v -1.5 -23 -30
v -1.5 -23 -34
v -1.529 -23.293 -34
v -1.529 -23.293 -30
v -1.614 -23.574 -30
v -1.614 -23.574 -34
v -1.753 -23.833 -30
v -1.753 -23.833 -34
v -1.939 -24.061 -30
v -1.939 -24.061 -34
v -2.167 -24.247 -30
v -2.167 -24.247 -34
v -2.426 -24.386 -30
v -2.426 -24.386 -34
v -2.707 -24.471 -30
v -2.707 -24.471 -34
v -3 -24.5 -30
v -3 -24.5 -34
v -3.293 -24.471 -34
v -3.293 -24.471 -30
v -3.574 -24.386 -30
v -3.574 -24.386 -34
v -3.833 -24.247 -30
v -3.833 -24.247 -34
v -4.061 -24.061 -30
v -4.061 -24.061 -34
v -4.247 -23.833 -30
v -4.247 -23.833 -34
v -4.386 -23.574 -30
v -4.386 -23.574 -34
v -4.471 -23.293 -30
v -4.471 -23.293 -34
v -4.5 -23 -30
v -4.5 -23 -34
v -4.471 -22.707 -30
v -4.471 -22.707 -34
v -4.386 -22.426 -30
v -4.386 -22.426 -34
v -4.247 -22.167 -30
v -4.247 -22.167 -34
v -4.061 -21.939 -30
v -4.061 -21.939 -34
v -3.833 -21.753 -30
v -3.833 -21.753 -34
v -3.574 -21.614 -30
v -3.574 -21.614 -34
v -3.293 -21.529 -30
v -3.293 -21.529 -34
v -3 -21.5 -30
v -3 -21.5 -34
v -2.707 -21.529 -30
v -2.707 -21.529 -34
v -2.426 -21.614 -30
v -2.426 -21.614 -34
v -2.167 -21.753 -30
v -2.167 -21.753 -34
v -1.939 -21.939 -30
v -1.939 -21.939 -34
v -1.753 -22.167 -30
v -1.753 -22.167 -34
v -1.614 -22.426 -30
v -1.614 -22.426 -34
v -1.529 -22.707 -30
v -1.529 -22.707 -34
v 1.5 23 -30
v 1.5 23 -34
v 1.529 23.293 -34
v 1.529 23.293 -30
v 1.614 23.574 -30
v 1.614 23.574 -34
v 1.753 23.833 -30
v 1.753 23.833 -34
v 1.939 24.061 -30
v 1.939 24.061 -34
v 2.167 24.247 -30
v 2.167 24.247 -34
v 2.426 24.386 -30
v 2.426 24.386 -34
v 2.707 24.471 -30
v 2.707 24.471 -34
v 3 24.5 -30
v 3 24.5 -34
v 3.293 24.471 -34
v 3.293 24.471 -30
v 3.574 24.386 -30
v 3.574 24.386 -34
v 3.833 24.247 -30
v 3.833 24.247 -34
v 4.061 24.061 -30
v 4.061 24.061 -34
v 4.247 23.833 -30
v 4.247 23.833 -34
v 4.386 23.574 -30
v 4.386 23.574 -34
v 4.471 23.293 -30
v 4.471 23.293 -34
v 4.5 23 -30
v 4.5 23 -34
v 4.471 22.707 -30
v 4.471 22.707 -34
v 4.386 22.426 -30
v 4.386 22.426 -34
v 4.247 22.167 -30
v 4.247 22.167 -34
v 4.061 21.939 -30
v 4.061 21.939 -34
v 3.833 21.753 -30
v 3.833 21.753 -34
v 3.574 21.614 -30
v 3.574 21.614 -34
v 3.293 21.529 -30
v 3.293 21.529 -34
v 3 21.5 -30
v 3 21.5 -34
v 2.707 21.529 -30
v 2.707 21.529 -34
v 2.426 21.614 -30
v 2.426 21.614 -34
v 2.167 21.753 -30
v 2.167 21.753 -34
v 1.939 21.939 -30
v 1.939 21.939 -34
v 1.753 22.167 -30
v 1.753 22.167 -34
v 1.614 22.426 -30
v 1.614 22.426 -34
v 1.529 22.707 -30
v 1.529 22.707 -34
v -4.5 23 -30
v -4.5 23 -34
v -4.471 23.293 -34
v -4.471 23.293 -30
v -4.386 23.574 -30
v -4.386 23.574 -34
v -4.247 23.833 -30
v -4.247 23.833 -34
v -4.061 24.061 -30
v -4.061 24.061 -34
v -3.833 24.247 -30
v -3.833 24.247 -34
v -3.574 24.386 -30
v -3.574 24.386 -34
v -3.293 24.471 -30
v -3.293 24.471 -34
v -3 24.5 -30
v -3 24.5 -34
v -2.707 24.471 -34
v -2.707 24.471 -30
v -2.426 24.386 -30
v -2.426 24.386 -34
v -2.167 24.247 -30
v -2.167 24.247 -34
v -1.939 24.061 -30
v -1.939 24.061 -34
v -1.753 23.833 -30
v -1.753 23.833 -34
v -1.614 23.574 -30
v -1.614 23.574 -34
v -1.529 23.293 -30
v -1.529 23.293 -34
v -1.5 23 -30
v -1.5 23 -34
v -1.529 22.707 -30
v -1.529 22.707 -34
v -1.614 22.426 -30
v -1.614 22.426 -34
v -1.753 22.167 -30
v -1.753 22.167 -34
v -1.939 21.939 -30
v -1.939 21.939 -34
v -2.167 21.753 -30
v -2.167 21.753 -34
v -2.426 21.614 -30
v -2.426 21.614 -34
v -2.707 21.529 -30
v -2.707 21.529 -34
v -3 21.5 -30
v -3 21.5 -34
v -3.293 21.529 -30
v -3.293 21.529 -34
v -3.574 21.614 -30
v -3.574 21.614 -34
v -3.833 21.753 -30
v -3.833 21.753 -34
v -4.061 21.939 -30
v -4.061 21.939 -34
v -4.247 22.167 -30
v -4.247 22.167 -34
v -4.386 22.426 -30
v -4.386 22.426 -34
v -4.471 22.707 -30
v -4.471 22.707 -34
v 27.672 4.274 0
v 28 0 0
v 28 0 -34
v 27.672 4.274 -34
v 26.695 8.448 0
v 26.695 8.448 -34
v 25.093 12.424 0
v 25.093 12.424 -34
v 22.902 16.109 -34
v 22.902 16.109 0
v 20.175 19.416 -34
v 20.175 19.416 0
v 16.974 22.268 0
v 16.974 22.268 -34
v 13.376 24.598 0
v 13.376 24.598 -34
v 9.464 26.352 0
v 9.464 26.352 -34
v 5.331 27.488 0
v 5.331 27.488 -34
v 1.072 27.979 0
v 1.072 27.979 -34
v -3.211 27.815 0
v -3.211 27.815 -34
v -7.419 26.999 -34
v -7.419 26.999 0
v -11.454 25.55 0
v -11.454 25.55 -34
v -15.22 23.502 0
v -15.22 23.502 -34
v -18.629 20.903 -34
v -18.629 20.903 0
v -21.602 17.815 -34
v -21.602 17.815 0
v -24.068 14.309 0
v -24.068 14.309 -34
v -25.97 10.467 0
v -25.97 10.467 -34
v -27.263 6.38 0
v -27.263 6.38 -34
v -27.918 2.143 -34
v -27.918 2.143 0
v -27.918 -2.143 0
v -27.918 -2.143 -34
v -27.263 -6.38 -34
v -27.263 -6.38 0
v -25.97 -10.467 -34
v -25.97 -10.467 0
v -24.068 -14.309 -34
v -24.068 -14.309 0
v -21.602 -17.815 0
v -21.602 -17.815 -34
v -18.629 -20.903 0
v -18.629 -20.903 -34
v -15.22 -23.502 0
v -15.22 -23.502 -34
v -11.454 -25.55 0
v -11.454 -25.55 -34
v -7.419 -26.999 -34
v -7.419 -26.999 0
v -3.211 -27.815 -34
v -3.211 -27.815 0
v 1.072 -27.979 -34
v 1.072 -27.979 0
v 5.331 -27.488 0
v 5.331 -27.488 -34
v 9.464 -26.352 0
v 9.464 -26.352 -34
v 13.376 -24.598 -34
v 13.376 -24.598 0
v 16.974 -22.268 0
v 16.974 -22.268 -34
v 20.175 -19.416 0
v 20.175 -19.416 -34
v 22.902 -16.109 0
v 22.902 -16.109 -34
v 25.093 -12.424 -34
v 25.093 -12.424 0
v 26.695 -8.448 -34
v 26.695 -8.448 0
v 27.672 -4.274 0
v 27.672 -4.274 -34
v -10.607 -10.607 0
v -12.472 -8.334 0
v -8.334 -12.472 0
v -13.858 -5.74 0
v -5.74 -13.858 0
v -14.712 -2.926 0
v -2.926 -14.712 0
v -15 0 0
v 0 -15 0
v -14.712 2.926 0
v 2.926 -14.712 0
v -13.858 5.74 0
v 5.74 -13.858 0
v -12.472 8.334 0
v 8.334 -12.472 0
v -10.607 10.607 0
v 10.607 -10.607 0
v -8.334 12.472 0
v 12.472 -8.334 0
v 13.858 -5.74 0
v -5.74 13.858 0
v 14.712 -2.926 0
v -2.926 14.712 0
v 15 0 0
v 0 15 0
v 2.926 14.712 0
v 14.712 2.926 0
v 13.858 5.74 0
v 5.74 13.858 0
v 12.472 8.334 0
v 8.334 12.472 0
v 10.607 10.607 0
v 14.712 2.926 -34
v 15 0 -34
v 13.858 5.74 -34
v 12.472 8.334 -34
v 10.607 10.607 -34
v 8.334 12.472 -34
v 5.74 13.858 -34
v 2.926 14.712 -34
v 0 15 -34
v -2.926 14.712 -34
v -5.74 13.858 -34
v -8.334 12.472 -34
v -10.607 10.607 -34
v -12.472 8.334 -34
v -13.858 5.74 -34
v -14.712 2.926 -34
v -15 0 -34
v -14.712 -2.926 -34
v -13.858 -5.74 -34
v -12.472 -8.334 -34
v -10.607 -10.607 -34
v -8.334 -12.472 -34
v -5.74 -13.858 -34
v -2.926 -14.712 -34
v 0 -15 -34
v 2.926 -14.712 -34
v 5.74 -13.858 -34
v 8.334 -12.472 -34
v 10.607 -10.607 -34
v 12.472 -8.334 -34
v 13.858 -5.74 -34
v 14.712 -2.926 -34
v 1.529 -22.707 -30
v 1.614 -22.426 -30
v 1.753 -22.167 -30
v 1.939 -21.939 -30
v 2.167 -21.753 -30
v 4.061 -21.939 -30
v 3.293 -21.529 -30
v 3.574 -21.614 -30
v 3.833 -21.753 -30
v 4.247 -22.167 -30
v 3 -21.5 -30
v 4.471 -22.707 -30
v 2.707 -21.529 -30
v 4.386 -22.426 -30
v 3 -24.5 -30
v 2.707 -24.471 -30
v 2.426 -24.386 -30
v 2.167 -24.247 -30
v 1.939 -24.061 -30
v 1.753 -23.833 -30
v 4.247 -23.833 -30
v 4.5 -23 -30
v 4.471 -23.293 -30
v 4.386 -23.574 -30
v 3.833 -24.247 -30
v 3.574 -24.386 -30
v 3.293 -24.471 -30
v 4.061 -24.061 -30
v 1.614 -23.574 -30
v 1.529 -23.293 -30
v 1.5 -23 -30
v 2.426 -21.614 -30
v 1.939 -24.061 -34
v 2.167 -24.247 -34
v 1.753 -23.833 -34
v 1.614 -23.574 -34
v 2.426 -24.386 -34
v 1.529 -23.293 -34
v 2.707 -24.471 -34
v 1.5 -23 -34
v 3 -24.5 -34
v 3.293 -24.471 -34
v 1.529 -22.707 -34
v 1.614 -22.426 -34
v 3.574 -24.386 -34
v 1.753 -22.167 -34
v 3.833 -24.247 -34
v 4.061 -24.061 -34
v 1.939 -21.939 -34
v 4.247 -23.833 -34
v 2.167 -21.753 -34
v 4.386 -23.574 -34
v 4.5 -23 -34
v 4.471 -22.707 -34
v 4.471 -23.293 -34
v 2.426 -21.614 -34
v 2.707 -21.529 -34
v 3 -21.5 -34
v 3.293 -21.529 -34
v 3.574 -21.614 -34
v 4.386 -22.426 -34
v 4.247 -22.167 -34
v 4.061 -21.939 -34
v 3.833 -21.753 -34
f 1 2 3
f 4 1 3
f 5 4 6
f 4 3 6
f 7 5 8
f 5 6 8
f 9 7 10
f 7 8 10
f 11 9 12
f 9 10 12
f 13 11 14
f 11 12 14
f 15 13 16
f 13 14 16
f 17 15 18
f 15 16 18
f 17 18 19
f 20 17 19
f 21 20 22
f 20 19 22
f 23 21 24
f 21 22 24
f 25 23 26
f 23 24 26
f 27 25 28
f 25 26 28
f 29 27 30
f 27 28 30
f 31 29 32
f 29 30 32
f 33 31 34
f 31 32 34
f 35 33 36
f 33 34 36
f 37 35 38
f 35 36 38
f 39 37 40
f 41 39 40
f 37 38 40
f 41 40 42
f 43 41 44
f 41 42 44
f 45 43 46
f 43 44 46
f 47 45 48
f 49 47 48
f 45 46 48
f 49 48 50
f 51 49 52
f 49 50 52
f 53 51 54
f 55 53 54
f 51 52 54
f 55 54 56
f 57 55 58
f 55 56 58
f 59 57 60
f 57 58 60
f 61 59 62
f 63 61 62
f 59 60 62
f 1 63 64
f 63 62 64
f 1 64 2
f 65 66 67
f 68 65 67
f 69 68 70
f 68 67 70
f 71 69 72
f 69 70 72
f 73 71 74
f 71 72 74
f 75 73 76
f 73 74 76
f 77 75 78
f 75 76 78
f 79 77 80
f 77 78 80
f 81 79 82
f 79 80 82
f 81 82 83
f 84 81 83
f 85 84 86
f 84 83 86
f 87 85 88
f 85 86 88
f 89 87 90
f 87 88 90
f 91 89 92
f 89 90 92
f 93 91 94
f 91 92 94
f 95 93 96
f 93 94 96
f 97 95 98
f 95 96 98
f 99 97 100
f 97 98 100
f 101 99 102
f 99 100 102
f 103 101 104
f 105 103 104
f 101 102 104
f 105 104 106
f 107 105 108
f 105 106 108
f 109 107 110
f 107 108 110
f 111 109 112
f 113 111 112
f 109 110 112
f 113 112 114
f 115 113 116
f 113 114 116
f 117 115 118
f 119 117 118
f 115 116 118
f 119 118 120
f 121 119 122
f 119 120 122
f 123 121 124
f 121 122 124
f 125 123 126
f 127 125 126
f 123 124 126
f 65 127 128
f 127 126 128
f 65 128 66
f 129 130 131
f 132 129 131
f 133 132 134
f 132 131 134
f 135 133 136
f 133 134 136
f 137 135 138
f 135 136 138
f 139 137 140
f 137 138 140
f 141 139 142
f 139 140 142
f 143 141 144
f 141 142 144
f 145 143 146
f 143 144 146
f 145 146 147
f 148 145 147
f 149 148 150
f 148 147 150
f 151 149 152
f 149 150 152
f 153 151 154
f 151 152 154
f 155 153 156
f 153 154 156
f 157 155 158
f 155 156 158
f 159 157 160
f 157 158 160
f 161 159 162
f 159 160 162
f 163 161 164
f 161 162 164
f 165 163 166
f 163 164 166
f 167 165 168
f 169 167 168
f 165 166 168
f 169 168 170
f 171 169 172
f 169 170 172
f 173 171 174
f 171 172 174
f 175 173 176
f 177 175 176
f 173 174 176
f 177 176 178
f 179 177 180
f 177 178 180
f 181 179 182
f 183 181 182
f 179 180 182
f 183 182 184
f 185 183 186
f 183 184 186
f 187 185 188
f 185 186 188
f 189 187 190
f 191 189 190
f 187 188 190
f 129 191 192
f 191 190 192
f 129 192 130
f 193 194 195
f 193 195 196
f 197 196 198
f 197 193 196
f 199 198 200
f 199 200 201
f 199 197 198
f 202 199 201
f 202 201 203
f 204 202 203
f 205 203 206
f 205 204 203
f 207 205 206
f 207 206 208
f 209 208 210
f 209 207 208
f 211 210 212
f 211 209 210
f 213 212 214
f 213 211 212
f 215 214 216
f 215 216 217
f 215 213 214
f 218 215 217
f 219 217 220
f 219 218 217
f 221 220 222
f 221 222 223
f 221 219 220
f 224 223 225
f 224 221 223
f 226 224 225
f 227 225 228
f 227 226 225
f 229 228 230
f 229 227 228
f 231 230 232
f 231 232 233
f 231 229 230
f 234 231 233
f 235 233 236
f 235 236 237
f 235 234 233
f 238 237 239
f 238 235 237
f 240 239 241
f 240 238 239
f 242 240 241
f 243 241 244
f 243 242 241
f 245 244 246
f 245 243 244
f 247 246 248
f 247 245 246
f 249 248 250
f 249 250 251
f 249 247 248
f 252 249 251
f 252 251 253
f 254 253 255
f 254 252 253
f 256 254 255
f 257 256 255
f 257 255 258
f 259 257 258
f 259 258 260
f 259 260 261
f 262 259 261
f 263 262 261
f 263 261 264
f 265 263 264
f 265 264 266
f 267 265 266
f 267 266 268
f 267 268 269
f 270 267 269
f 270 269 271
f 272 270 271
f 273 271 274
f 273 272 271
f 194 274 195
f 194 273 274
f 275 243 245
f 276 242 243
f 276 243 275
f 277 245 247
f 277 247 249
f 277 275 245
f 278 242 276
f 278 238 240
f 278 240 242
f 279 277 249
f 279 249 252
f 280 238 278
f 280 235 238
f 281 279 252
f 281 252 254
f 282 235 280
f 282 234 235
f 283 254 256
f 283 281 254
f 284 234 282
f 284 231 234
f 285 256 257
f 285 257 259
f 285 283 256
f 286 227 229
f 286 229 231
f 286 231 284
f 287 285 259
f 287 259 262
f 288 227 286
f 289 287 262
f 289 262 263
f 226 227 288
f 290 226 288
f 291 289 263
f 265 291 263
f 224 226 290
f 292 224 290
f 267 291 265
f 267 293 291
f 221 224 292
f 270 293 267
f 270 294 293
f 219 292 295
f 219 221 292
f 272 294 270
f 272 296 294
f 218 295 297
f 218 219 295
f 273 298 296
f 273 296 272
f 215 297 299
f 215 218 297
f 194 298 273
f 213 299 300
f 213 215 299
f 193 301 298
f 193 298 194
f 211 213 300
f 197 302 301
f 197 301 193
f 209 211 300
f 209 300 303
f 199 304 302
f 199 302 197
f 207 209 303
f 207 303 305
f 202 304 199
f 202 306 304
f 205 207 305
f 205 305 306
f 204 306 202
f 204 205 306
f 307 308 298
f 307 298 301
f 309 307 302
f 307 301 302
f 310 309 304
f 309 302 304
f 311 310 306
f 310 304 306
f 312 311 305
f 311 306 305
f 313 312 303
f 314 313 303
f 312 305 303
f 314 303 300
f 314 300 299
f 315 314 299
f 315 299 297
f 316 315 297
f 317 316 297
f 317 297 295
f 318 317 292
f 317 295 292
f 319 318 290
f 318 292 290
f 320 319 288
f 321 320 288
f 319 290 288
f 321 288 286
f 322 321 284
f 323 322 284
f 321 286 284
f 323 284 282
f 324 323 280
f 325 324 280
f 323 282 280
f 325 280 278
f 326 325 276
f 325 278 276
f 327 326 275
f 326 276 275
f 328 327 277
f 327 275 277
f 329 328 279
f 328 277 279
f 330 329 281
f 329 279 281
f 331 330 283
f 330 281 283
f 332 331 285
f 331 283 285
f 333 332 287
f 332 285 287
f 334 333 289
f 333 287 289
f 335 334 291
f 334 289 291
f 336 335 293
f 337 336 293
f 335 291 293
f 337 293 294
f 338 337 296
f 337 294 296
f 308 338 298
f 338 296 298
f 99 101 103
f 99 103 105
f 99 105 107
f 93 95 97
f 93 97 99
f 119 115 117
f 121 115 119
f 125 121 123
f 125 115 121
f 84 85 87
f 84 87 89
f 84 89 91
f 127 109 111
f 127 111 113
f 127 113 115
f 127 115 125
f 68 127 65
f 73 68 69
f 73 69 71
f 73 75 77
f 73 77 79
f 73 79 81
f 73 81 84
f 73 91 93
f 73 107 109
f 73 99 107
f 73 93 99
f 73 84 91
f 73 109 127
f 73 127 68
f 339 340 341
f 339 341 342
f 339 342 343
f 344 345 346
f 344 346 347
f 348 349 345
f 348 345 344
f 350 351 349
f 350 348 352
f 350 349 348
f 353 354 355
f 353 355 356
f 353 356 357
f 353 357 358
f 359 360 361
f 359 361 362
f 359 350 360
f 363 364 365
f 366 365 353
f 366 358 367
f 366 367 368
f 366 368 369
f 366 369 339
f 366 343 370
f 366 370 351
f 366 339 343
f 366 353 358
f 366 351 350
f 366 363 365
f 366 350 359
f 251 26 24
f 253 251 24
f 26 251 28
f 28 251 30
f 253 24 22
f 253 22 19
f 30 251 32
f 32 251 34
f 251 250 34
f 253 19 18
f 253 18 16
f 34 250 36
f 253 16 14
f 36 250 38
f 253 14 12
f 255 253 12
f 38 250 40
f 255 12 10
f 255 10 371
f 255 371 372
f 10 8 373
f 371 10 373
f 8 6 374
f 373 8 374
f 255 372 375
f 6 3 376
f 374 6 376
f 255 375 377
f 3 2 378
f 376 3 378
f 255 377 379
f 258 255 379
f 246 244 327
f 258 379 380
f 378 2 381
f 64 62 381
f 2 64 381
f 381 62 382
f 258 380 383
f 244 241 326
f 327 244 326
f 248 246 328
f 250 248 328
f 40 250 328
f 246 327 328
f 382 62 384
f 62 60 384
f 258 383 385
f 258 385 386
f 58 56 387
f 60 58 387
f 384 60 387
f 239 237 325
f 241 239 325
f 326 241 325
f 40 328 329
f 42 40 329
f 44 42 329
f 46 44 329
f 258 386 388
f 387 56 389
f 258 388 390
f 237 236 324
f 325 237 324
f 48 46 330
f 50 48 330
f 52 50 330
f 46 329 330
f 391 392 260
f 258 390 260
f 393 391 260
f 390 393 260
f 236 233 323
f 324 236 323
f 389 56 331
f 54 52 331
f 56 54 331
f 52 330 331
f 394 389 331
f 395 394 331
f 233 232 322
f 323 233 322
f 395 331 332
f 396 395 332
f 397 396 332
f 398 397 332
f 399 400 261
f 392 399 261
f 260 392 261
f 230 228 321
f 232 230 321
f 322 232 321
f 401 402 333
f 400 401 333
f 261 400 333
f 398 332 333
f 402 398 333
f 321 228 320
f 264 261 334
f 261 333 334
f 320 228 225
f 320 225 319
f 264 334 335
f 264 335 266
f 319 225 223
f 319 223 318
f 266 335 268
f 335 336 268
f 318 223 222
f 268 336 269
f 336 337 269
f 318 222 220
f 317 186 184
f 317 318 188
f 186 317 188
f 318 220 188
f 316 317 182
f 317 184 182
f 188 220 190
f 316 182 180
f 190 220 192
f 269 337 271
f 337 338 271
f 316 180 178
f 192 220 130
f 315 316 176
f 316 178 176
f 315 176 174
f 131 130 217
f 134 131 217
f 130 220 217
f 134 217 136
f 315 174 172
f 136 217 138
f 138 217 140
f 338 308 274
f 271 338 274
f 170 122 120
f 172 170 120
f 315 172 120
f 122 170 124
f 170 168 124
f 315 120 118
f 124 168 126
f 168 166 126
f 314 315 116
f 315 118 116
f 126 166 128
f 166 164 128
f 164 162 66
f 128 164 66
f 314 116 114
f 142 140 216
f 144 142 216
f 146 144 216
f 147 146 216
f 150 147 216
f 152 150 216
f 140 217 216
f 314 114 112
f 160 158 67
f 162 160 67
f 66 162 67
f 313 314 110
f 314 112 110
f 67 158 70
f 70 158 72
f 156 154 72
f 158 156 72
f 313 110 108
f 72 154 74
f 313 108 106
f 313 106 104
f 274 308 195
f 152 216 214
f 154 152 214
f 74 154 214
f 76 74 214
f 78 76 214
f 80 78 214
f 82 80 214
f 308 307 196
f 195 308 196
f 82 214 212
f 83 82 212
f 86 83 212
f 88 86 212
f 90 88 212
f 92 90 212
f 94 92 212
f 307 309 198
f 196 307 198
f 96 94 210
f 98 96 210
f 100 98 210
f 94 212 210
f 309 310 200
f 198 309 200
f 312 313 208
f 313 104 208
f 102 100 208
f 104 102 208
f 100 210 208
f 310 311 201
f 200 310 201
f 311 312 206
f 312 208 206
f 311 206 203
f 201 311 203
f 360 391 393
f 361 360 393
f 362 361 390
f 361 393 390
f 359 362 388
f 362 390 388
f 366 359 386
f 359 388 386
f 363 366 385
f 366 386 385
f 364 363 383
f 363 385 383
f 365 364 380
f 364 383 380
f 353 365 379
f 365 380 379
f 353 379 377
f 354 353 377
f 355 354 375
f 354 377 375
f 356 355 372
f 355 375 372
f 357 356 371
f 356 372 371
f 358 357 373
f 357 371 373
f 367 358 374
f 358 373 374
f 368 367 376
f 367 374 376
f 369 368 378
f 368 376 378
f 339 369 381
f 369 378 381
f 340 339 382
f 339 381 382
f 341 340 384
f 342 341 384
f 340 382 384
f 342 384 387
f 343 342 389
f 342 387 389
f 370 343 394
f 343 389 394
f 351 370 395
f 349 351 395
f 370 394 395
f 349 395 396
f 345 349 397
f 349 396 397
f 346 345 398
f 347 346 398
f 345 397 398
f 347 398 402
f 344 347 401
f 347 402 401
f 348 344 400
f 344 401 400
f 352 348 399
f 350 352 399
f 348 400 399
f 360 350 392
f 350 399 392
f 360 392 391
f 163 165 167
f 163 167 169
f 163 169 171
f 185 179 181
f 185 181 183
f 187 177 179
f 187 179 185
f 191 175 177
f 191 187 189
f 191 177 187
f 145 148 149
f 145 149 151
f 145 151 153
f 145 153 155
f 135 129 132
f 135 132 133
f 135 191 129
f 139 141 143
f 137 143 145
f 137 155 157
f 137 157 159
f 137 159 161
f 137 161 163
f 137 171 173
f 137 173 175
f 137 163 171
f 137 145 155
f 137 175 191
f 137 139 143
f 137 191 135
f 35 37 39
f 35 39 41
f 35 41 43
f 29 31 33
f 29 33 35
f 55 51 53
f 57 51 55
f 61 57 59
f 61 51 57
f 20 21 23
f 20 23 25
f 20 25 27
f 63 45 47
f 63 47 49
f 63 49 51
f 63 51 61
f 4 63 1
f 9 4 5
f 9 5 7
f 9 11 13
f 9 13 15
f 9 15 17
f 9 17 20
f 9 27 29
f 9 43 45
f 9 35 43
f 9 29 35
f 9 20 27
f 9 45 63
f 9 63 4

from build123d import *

# Parameters (mm, degrees)
SKETCH1_R           = 28
SKETCH1_R_2         = 15
BOSS_EXTRUDE1_DEPTH = 34
SKETCH2_R           = 1.5
CUT_EXTRUDE1_DEPTH  = 4
CIRPATTERN1_COUNT   = 2


with BuildPart() as part:
    # Sketch1 → Boss-Extrude1 (new body)
    with BuildSketch(Plane.XY):
        Circle(SKETCH1_R)
        Circle(SKETCH1_R_2, mode=Mode.SUBTRACT)
    extrude(amount=-BOSS_EXTRUDE1_DEPTH)

    # Sketch2 → Cut-Extrude1 (cut)
    with BuildSketch(Plane(origin=(0, 0, -34), x_dir=(-1, 0, 0), z_dir=(0, 0, -1))):
        with Locations((3, 23)):
            Circle(SKETCH2_R)
        with Locations((-3, 23)):
            Circle(SKETCH2_R)
    cut_extrude1 = extrude(amount=-CUT_EXTRUDE1_DEPTH, mode=Mode.SUBTRACT)

    # CirPattern1: Cut-Extrude1 ×2 about axis
    cirpattern1_axis = Axis((0, 0, -34), (0, 0, 1))
    for i in range(1, CIRPATTERN1_COUNT):
        add(cut_extrude1.rotate(cirpattern1_axis, i * 360 / CIRPATTERN1_COUNT), mode=Mode.SUBTRACT)


solid = part.part
